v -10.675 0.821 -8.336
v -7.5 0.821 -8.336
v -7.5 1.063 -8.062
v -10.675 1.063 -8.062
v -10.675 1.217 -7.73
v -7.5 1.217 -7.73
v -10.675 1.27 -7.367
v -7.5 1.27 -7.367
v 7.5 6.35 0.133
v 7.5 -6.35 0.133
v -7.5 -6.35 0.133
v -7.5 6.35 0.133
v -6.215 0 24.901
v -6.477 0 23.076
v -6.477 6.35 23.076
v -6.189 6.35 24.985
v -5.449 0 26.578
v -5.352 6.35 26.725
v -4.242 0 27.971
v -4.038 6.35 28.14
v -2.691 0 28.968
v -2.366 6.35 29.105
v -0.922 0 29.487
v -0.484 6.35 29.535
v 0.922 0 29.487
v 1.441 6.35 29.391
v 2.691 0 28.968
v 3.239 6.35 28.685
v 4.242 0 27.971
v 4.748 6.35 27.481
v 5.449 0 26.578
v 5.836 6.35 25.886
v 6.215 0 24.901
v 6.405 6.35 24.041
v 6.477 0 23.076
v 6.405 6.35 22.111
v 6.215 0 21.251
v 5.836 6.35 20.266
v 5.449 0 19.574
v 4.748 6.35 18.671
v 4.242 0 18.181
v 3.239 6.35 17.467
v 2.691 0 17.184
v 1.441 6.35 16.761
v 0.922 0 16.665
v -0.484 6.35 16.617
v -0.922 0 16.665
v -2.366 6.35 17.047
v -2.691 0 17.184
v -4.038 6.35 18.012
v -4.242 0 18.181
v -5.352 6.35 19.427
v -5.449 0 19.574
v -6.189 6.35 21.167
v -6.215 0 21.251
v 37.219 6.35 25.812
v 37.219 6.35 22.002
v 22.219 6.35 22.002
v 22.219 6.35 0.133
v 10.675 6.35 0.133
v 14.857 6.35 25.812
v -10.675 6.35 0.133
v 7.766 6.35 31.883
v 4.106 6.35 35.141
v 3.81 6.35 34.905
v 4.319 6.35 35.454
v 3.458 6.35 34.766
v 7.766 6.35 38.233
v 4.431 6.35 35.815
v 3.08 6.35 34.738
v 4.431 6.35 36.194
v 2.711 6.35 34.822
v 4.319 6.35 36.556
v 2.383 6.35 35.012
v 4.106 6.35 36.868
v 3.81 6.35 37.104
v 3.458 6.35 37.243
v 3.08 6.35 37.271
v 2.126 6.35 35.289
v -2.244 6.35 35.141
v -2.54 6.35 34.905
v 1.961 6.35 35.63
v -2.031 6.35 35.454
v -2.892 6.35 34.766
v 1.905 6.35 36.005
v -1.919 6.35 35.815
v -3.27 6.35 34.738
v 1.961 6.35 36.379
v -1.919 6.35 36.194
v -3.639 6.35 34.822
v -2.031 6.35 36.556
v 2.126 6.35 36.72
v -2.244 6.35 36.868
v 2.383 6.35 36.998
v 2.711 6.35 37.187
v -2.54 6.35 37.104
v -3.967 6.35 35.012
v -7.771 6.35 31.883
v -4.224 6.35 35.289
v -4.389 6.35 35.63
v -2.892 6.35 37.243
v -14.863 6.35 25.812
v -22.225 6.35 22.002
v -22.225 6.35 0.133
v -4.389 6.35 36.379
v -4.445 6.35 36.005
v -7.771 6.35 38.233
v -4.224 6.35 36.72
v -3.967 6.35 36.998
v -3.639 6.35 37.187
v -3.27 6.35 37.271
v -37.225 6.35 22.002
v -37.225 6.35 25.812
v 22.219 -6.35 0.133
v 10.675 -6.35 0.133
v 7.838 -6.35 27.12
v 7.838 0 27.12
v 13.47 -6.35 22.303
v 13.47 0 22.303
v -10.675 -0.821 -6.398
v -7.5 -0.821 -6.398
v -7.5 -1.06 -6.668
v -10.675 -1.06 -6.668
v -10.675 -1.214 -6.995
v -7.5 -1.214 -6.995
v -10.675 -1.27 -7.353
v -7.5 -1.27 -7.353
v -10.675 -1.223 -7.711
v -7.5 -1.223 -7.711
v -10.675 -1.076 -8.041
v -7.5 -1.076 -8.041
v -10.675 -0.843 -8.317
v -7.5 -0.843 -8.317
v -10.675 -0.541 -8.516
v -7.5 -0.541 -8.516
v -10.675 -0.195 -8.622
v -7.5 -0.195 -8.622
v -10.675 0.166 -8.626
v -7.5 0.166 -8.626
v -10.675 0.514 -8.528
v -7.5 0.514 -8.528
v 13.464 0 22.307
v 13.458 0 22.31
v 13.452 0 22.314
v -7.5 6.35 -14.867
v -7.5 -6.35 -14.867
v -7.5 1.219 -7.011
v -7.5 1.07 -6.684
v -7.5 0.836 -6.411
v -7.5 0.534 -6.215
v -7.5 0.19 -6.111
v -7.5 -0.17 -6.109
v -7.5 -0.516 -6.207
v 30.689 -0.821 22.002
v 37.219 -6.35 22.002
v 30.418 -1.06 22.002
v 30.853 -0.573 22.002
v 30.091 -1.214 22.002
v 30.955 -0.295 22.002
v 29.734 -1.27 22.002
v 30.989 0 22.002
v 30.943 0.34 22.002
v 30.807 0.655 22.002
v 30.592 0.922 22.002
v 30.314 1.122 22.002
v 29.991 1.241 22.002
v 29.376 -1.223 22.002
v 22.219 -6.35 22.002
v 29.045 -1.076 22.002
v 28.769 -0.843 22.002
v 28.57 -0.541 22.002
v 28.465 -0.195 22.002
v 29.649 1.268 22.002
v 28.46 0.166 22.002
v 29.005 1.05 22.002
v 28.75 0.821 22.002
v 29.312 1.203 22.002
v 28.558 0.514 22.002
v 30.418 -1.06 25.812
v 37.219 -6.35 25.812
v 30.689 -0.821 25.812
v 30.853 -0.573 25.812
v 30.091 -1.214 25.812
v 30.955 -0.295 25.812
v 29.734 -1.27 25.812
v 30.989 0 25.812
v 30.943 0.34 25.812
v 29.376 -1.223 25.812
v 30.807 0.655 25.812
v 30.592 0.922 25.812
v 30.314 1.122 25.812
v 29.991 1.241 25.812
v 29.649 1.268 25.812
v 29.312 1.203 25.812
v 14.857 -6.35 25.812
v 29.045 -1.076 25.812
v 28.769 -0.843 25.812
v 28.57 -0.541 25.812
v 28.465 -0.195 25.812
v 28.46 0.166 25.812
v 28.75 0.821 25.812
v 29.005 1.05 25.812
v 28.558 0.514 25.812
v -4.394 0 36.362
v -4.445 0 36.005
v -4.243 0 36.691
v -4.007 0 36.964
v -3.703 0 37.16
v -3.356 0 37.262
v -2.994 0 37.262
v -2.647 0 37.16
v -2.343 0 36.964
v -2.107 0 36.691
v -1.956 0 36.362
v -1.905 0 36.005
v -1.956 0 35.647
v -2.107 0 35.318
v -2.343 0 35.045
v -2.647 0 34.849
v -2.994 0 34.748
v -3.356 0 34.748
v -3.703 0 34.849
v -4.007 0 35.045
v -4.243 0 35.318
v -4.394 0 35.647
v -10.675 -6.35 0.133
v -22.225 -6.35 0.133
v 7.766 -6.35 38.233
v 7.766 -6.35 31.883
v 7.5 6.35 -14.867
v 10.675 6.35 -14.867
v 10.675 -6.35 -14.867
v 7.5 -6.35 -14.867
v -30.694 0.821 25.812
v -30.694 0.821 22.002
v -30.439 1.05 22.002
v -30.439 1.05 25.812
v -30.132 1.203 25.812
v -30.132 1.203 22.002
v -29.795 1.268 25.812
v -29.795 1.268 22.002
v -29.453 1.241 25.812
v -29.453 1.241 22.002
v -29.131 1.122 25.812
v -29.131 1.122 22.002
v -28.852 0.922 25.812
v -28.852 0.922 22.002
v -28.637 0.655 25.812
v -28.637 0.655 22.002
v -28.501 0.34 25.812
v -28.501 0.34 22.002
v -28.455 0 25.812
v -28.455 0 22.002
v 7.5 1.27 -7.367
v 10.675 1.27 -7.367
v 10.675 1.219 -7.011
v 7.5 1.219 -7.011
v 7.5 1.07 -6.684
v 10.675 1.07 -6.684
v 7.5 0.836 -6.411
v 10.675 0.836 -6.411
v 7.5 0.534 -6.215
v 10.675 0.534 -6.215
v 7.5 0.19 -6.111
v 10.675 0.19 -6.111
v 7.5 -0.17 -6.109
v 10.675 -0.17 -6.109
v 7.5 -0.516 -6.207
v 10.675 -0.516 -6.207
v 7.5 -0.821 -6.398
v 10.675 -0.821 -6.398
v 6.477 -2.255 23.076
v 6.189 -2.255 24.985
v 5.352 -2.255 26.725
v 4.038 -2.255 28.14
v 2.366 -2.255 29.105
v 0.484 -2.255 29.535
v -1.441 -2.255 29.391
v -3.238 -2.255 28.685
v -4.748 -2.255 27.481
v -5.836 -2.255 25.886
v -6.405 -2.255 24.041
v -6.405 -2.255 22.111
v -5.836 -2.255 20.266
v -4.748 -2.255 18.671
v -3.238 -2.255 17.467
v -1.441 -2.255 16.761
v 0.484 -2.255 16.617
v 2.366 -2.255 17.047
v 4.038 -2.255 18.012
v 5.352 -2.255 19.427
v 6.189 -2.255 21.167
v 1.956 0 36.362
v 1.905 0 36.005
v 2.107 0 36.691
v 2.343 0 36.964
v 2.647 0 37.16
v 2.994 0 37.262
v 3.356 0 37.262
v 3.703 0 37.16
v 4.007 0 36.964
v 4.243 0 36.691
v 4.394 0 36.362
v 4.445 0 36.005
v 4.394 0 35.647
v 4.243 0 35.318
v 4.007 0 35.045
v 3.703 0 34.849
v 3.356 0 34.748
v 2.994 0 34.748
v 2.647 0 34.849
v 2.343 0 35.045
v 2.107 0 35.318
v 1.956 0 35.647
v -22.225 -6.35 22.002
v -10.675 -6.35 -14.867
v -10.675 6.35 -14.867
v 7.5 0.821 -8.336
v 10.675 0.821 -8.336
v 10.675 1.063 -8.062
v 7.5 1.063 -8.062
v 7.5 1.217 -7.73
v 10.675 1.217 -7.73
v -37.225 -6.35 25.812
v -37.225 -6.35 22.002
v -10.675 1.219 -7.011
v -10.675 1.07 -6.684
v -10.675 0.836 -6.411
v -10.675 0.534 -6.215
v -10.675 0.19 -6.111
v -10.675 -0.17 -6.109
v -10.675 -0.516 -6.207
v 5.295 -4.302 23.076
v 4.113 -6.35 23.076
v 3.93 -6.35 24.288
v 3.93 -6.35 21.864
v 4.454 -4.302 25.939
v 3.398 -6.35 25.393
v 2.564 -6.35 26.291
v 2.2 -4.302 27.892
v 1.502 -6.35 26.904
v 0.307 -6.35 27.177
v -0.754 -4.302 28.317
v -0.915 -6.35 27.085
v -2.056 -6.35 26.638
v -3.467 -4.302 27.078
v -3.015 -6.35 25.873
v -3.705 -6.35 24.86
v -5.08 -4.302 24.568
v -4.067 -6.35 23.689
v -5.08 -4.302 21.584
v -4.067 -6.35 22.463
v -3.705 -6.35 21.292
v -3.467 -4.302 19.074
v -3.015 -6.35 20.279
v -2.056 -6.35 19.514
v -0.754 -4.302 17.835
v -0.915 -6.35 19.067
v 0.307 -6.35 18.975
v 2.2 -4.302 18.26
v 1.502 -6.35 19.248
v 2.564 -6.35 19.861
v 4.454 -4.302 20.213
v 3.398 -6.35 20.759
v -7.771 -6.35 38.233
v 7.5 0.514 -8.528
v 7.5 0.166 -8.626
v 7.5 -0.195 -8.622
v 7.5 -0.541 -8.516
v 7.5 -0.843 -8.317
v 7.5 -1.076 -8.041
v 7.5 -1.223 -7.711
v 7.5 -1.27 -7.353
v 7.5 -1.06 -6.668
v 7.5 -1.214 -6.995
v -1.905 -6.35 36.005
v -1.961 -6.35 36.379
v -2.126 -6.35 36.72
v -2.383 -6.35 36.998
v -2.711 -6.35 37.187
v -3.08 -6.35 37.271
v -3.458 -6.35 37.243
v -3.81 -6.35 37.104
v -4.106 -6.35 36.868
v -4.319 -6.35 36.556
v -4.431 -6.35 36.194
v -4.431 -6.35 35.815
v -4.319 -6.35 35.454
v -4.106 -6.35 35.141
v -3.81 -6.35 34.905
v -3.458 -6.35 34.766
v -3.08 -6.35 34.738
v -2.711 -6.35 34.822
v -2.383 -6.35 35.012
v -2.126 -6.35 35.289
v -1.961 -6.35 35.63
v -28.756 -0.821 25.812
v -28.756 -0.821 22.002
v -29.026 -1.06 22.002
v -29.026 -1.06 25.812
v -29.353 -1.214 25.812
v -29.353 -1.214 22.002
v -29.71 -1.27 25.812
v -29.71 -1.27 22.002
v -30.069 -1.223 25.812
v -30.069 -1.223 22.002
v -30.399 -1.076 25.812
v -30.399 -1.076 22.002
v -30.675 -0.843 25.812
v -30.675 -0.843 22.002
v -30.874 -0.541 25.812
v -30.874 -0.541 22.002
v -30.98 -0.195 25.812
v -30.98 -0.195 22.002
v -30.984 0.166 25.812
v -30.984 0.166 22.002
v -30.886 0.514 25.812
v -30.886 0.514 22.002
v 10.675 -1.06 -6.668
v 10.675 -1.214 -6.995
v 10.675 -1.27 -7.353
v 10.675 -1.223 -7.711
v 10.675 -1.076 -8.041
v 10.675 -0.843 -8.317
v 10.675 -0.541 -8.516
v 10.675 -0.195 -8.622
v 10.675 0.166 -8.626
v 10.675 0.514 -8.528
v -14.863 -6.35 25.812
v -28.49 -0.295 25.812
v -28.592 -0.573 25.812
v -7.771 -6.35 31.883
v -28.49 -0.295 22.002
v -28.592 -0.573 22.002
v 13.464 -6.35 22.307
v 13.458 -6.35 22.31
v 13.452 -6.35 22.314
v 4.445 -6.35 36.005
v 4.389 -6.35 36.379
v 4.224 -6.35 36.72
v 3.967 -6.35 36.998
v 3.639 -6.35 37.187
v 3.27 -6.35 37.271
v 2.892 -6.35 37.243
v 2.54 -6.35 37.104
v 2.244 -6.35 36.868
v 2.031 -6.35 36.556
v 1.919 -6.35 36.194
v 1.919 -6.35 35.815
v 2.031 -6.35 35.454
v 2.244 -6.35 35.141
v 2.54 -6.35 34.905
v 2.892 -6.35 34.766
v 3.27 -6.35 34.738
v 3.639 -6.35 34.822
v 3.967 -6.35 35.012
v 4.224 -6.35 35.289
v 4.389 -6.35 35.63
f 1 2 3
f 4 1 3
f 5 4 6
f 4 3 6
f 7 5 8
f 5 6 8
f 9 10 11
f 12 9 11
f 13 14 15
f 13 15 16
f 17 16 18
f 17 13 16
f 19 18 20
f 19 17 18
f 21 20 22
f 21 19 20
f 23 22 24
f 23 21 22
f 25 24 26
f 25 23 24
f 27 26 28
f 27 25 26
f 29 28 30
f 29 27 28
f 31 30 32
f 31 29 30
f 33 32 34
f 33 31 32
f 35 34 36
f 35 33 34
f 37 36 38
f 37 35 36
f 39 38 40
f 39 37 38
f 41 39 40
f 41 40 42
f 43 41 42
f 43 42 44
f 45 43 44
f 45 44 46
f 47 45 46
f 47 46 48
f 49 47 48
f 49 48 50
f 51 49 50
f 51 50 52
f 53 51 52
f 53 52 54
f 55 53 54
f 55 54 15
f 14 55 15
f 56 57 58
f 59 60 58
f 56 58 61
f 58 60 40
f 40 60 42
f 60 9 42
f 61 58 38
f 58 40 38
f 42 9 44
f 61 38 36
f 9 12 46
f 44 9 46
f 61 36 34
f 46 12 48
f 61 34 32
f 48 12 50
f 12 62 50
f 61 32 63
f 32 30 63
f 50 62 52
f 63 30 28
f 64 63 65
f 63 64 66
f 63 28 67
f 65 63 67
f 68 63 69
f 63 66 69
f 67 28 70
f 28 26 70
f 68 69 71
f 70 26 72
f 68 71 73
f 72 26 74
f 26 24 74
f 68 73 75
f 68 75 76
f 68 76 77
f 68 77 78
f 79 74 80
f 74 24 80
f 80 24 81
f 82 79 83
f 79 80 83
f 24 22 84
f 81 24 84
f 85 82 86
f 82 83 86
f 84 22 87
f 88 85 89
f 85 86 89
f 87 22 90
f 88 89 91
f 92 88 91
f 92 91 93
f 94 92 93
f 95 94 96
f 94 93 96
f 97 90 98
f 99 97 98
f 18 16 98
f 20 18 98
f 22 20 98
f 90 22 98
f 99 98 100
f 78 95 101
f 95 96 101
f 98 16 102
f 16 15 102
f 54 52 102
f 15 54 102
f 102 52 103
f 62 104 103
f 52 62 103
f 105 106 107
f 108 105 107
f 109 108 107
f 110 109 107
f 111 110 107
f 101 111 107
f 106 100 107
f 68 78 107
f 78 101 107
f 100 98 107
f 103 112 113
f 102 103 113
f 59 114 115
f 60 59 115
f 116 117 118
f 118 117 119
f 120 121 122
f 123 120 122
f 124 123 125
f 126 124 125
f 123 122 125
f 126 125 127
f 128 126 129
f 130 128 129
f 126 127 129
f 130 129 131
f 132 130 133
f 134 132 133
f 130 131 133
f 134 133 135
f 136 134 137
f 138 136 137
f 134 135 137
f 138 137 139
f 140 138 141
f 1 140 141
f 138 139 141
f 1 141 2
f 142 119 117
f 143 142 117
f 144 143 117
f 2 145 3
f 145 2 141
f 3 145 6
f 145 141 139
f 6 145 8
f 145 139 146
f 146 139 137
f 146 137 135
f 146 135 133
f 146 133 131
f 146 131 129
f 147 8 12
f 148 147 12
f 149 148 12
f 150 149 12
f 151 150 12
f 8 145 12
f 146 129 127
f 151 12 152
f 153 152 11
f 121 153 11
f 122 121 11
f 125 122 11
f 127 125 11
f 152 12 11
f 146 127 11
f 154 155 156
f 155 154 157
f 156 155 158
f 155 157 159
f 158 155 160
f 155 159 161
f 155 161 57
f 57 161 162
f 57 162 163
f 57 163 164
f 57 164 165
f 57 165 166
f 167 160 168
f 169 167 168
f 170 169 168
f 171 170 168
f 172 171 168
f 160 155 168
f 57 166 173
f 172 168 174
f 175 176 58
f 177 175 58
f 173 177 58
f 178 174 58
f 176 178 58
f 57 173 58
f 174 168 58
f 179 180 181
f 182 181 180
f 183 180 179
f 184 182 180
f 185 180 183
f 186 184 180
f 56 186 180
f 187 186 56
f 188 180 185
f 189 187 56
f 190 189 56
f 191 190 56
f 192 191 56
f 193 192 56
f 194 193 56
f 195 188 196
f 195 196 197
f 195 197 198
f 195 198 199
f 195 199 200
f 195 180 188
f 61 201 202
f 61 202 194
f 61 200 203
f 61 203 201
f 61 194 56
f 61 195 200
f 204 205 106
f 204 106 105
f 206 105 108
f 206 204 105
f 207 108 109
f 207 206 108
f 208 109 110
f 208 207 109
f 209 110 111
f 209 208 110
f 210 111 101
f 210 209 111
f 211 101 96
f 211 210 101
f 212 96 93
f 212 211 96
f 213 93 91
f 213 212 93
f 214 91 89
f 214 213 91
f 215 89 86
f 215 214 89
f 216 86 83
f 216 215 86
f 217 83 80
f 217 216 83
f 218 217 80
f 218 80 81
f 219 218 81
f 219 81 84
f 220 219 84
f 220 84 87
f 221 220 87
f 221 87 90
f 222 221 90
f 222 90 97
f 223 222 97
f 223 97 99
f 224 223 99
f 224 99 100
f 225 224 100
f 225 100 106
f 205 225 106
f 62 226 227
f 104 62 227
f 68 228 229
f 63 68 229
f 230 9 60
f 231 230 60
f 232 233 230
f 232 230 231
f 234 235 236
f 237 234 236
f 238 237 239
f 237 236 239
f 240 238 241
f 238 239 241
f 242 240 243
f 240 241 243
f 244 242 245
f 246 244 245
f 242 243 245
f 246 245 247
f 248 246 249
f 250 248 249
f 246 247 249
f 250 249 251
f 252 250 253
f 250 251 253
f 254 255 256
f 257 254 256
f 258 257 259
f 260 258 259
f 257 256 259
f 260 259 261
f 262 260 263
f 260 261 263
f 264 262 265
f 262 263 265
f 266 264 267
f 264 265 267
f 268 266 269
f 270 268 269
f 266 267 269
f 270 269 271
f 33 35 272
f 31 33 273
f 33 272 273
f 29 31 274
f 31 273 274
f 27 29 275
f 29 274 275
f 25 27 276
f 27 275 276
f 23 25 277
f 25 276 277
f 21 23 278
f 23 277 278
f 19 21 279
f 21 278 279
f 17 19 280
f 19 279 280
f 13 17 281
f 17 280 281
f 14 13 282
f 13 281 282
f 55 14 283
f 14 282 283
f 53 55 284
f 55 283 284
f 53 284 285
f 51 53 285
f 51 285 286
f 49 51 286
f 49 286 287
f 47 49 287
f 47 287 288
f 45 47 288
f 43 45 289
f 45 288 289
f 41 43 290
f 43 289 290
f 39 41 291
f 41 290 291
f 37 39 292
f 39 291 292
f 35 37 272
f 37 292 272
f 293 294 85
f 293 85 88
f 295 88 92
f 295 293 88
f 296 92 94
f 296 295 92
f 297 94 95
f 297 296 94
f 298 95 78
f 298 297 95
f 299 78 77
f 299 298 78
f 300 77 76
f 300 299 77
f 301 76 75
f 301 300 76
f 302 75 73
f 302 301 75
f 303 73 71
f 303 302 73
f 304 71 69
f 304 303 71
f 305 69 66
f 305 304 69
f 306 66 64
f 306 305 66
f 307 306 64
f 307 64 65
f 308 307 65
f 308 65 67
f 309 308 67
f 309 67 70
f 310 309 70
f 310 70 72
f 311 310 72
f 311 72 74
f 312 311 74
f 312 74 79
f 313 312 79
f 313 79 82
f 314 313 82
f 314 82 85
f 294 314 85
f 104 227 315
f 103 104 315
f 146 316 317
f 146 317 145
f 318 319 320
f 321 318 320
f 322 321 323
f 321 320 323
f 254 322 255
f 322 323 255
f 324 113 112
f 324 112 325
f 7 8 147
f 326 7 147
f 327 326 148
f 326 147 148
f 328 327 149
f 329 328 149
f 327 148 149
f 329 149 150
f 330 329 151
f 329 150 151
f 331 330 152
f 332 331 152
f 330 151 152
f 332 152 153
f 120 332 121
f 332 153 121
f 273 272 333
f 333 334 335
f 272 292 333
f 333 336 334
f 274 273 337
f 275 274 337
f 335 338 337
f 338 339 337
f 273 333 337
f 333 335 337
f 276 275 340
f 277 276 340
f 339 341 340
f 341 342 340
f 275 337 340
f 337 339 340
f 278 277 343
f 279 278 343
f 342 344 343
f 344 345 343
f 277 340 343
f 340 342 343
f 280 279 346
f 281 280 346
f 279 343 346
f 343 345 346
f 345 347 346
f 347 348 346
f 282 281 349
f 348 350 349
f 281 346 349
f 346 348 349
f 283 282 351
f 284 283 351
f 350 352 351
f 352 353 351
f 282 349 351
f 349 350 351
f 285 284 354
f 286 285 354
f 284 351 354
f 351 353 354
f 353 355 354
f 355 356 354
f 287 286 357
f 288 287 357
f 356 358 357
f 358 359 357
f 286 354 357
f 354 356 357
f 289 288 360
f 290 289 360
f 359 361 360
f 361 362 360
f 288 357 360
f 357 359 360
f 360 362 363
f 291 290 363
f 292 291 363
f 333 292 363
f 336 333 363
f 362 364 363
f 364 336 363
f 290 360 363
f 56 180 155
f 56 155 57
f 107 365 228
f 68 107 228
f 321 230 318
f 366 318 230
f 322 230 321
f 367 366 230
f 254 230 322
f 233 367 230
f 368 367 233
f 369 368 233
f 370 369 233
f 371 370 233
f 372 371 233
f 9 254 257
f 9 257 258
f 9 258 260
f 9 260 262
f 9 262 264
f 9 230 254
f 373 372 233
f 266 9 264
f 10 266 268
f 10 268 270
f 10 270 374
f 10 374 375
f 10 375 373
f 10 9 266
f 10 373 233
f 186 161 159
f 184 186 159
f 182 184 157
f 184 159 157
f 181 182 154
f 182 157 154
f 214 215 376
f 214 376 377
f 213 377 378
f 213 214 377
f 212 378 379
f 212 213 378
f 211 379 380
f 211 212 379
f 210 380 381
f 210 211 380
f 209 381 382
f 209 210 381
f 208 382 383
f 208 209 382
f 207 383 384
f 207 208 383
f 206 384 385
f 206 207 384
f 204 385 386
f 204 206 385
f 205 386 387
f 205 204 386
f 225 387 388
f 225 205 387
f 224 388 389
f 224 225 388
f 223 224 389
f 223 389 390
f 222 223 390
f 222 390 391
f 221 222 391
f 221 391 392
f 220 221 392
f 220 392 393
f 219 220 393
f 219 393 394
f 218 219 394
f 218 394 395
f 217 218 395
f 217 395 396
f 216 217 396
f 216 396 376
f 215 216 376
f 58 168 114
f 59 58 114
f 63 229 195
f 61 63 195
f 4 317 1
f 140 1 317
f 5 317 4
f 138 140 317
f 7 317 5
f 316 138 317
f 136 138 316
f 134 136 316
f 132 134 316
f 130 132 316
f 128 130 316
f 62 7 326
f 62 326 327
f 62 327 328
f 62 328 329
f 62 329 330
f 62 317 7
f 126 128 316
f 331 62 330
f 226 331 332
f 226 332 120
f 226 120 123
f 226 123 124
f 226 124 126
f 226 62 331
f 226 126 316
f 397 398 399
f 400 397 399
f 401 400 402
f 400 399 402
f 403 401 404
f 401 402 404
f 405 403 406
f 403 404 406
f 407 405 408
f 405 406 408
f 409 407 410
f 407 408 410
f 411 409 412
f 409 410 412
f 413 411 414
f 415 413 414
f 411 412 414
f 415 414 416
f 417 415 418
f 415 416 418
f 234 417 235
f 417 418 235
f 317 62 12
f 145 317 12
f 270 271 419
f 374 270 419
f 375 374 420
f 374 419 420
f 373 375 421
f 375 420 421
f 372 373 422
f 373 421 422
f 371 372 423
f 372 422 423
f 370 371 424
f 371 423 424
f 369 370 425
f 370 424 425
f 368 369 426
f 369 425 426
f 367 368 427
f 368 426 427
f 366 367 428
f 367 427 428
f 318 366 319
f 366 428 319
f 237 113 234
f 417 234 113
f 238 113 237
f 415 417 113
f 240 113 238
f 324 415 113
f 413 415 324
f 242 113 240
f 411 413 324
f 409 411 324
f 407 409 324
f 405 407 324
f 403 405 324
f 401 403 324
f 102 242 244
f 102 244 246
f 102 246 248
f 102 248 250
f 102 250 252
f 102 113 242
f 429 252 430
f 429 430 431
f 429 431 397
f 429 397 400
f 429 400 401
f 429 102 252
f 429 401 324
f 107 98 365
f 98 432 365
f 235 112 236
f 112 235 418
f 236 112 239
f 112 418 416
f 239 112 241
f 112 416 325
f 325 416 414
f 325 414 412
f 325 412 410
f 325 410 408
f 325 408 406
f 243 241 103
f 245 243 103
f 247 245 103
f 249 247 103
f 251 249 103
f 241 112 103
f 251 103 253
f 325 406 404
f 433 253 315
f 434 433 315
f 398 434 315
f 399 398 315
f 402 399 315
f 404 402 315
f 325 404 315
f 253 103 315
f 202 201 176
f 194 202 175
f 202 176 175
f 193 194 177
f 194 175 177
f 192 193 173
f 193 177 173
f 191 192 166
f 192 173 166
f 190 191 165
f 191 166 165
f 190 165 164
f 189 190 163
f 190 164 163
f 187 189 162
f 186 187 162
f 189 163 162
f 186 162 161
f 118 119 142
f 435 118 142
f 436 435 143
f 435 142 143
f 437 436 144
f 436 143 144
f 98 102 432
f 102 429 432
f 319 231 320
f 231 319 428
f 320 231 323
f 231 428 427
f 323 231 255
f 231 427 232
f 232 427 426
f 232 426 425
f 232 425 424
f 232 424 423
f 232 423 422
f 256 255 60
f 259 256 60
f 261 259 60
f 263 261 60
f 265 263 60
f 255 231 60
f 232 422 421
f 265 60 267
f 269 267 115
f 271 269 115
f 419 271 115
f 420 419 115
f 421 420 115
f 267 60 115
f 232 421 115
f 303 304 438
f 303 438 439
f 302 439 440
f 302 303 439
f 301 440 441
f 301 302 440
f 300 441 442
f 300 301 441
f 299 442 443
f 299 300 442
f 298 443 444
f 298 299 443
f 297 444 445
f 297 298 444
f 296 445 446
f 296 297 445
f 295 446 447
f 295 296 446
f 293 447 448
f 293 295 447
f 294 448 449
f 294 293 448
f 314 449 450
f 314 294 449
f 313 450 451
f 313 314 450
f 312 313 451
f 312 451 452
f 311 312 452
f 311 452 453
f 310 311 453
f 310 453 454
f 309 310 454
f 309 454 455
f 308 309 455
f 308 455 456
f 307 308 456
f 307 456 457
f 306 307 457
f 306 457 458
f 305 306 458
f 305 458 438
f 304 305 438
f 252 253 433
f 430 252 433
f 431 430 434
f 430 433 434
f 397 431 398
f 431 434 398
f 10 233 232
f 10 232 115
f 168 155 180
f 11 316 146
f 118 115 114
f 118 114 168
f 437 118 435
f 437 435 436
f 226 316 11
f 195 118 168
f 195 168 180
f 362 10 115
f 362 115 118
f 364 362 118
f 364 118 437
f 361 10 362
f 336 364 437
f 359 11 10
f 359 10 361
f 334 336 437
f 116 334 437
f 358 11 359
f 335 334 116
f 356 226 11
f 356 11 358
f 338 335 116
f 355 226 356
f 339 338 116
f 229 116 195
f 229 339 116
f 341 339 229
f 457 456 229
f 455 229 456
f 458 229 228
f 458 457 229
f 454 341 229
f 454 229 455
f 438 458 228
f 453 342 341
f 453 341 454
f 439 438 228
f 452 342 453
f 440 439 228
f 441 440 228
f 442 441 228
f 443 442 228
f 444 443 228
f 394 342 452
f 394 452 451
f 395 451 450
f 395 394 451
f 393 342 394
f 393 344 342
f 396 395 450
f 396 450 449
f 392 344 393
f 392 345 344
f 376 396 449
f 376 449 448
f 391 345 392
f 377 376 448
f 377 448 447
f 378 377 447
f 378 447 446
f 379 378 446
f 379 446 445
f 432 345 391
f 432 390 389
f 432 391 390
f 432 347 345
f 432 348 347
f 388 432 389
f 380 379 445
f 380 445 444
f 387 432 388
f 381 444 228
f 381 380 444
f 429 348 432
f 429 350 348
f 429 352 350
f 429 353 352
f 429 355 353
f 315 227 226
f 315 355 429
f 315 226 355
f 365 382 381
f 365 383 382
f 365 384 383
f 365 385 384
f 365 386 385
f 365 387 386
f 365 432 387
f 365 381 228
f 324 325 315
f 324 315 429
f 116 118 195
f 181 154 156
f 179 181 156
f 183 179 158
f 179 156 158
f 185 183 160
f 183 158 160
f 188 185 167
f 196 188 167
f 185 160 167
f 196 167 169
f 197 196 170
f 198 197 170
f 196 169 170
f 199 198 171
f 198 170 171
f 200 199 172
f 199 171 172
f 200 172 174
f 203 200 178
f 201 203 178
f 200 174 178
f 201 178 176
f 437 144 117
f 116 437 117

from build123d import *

# Parameters (mm, degrees)
F0_R        = 1.27
F0_R_2      = 3.96875
F1_DEPTH    = 6.35
F2_R        = 6.477
F2_R_2      = 1.27
F3_DEPTH    = 6.35
F4_S5_R     = 6.477
F4_T6_DEPTH = 13
F5_W        = 12.7
F5_H        = 3.81
F6_DEPTH    = 14.9999954
F8_DEPTH    = 25.4
F9_W        = 12.7
F9_H        = 3.81
F10_DEPTH   = 14.9999954
F12_DEPTH   = 25.4
F13_W       = 3.175
F13_H       = 12.7
F14_DEPTH   = 14.9999954
F16_DEPTH   = 25.4


# Not quite as in the source:
# - a fillet or chamfer that OpenCascade refuses, or shapes differently, is made with other operations: its cross-section is extruded or revolved along the edge and cut away or added
# - after a boolean that leaves OpenCascade's solid faulty, fix() repairs it
# - ends of sketch curves that miss each other by under 0.0002 mm in the source are joined


with BuildPart() as f1:
    # F0 (on Front) → F1 (new body)
    with BuildSketch(Plane.XZ):
        Polygon((-7.493, 0.1328983575), (0, 0.1328983575), (7.493, 0.1328983575), (22.2194990303, 0.1328983575), (22.2194990303, 19.5094533027), (14.8570176459, 25.8122983575), (7.7658264293, 31.8828983575), (7.7658264293, 38.2328983575), (-7.7713273633, 38.2328983575), (-7.7713273633, 31.8828983575), (-14.8625185798, 25.8122983575), (-22.2249999642, 19.5094533027), (-22.2249999642, 4.5234533027), (-22.2249999642, 0.1328983575), align=None)
        with Locations((-3.175, 36.0046029091)):
            Circle(F0_R, mode=Mode.SUBTRACT)
        with BuildLine():
            ThreePointArc((-1.6471995105, 13.7654938087), (-14.0416307026, 9.056743723), (-13.4701421127, 22.3031640975))
            Line((-13.4701421127, 22.3031640975), (-7.8430329322, 27.1203983575))
            Line((-7.8430329322, 27.1203983575), (-3.175, 27.1203983575))
            Line((-3.175, 27.1203983575), (-3.175, 30.2953983575))
            Line((-3.175, 30.2953983575), (-3.175, 33.4703983575))
            Line((-3.175, 33.4703983575), (3.175, 33.4703983575))
            Line((3.175, 33.4703983575), (3.175, 30.2953983575))
            Line((3.175, 30.2953983575), (3.175, 27.1203983575))
            Line((3.175, 27.1203983575), (7.8375319983, 27.1203983575))
            Line((7.8375319983, 27.1203983575), (13.4701421127, 22.3031640975))
            ThreePointArc((13.4701421127, 22.3031640975), (16.2995077669, 19.40684068), (17.3322006389, 15.4917998403))
            ThreePointArc((17.3322006389, 15.4917998403), (10.2711150187, 7.6028326022), (1.6507381924, 13.7496885133))
            ThreePointArc((1.6507381924, 13.7496885133), (0.0063534061, 14.7141035739), (-1.6471995105, 13.7654938087))
        make_face(mode=Mode.SUBTRACT)
        with Locations((3.175, 36.0046029091)):
            Circle(F0_R, mode=Mode.SUBTRACT)
        Polygon((14.8570176459, 25.8122983575), (22.2194990303, 19.5094533027), (22.2194990303, 25.8122983575), (17.4187807526, 25.8122983575), align=None)
        Polygon((-22.2249999642, 25.8122983575), (-22.2249999642, 19.5094533027), (-14.8625185798, 25.8122983575), (-17.4242816865, 25.8122983575), align=None)
        with BuildLine():
            ThreePointArc((13.4519986436, 22.3139871107), (4.7326542757, 21.9159130054), (1.6507381924, 13.7496885133))
            ThreePointArc((1.6507381924, 13.7496885133), (10.2711150187, 7.6028326022), (17.3322006389, 15.4917998403))
            ThreePointArc((17.3322006389, 15.4917998403), (16.2995077669, 19.40684068), (13.4701421127, 22.3031640975))
            ThreePointArc((13.4701421127, 22.3031640975), (13.461073979, 22.3085816404), (13.4519986436, 22.3139871107))
        make_face()
        with BuildLine():
            ThreePointArc((-1.4572006389, 15.4917998403), (-5.4796598384, 22.3966069904), (-13.4701421898, 22.3031640514))
            ThreePointArc((-13.4701421127, 22.3031640975), (-14.0416307026, 9.056743723), (-1.6471995105, 13.7654938087))
            ThreePointArc((-1.6471995105, 13.7654938087), (-1.5048433381, 14.6234346974), (-1.4572006389, 15.4917998403))
        make_face()
        with BuildLine():
            Line((-7.8430329322, 27.1203983575), (-13.4701422669, 22.3031640053))
            ThreePointArc((-13.4701421898, 22.3031640514), (-5.4796598384, 22.3966069904), (-1.4572006389, 15.4917998403))
            ThreePointArc((-1.4572006389, 15.4917998403), (-1.5048433381, 14.6234346974), (-1.6471995105, 13.7654938087))
            ThreePointArc((-1.6471995105, 13.7654938087), (0.0063534061, 14.7141035739), (1.6507381924, 13.7496885133))
            ThreePointArc((1.6507381924, 13.7496885133), (4.7326542757, 21.9159130054), (13.4519986436, 22.3139871107))
            Line((13.4519986436, 22.3139871107), (7.8375319983, 27.1203983575))
            Line((7.8375319983, 27.1203983575), (3.175, 27.1203983575))
            Line((3.175, 27.1203983575), (3.175, 30.2953983575))
            Line((3.175, 30.2953983575), (3.175, 33.4703983575))
            Line((3.175, 33.4703983575), (-3.175, 33.4703983575))
            Line((-3.175, 33.4703983575), (-3.175, 30.2953983575))
            Line((-3.175, 30.2953983575), (-3.175, 27.1203983575))
            Line((-3.175, 27.1203983575), (-7.8430329322, 27.1203983575))
        make_face()
        with Locations((0, 23.0759866536)):
            Circle(F0_R_2, mode=Mode.SUBTRACT)
    extrude(amount=F1_DEPTH)

    # F2 (on face) → F3 (join)
    with BuildSketch(Plane(origin=(0, 0, 0), x_dir=(-1, 0, 0), z_dir=(0, 1, 0))):
        Polygon((-22.2194990303, 25.8122983575), (-22.2194990303, 0.1328983575), (22.2249999642, 0.1328983575), (22.2249999642, 25.8122983575), (14.8625185798, 25.8122983575), (7.7713273633, 31.8828983575), (7.7713273633, 38.2328983575), (-7.7658264293, 38.2328983575), (-7.7658264293, 31.8828983575), (-14.8570176459, 25.8122983575), align=None)
        with Locations((0, 23.0759866536)):
            Circle(F2_R, mode=Mode.SUBTRACT)
        with Locations((-3.175, 36.0046029091)):
            Circle(F2_R_2, mode=Mode.SUBTRACT)
        with Locations((3.175, 36.0046029091)):
            Circle(F2_R_2, mode=Mode.SUBTRACT)
    extrude(amount=F3_DEPTH)

    # F4: chamfer of 3.81 x 6.5991135768 on 1 edges, made by hand


with BuildPart() as f4_tool2:
    # F4_s3 → F4_t4 (revolve)
    with BuildSketch(Plane.XY.offset(23.0759866536)):
        Polygon((7.77875, 0), (3.96875, -6.5991135768), (3.96875, 0), align=None)
    revolve(axis=Axis((0, 0, 23.0759866536), (0, -1, 0)))

    # F4_s5 → F4_t6 (intersect, symmetric)
    with BuildSketch(Plane.XZ.offset(3.3)):
        with Locations((0, 23.0759866536)):
            Circle(F4_S5_R)
    extrude(amount=F4_T6_DEPTH, both=True, mode=Mode.INTERSECT)


with BuildPart() as f1_1:
    add(f1.part)

    # F4_t1: cut F4_tool2
    add(f4_tool2.part, mode=Mode.SUBTRACT)

    # F5 (on face) → F6 (join)
    with BuildSketch(Plane(origin=(-22.2249999642, 0, 0), x_dir=(0, -1, 0), z_dir=(-1, 0, 0))):
        with Locations((0, 23.9072983575)):
            Rectangle(F5_W, F5_H)
    extrude(amount=F6_DEPTH)

    # F7 (on face) → F8 (cut)
    with BuildSketch(Plane(origin=(0, 0, 22.0022983575), x_dir=(1, 0, 0), z_dir=(0, 0, -1))):
        with BuildLine():
            ThreePointArc((-28.7557423483, 0.8206364192), (-30.5456340834, 0.969255316), (-30.6942529802, -0.8206364192))
            Line((-30.6942529802, -0.8206364192), (-28.7557423483, 0.8206364192))
        make_face()
        with BuildLine():
            Line((-28.7557423483, 0.8206364192), (-30.6942529802, -0.8206364192))
            ThreePointArc((-30.6942529802, -0.8206364192), (-29.2879932313, -1.1924458586), (-28.4549976642, 0))
            ThreePointArc((-28.4549976642, 0), (-28.5325518057, 0.4370044329), (-28.7557423483, 0.8206364192))
        make_face()
    extrude(amount=-F8_DEPTH, mode=Mode.SUBTRACT)

    # F9 (on face) → F10 (join)
    with BuildSketch(Plane.YZ.offset(22.2194990303)):
        with Locations((0, 23.9072983575)):
            Rectangle(F9_W, F9_H)
    extrude(amount=F10_DEPTH)

    # F11 (on face) → F12 (cut)
    with BuildSketch(Plane(origin=(0, 0, 22.0022983575), x_dir=(1, 0, 0), z_dir=(0, 0, -1))):
        with BuildLine():
            ThreePointArc((30.9894967303, 0), (30.9119425889, 0.4370044329), (30.6887520463, 0.8206364192))
            Line((30.6887520463, 0.8206364192), (28.7502414143, -0.8206364192))
            ThreePointArc((28.7502414143, -0.8206364192), (30.1565011632, -1.1924458586), (30.9894967303, 0))
        make_face()
        with BuildLine():
            Line((28.7502414143, -0.8206364192), (30.6887520463, 0.8206364192))
            ThreePointArc((30.6887520463, 0.8206364192), (28.8988603111, 0.969255316), (28.7502414143, -0.8206364192))
        make_face()
    extrude(amount=-F12_DEPTH, mode=Mode.SUBTRACT)

    # F13 (on face) → F14 (join)
    with BuildSketch(Plane(origin=(0, 0, 0.1328983575), x_dir=(1, 0, 0), z_dir=(0, 0, -1))):
        with Locations((9.0874977, 0)):
            Rectangle(F13_W, F13_H)
        with Locations((-9.0874977, 0)):
            Rectangle(F13_W, F13_H)
    extrude(amount=F14_DEPTH)

    add(f1_1.part.fix(), mode=Mode.REPLACE)

    # F15 (on face) → F16 (cut)
    with BuildSketch(Plane.YZ.offset(10.6749977)):
        with BuildLine():
            ThreePointArc((1.27, -7.3670993425), (0.5341777549, -6.2149039918), (-0.8206364192, -6.3978440265))
            Line((-0.8206364192, -6.3978440265), (0.8206364192, -8.3363546585))
            ThreePointArc((0.8206364192, -8.3363546585), (1.1521953507, -7.9012770974), (1.27, -7.3670993425))
        make_face()
        with BuildLine():
            Line((0.8206364192, -8.3363546585), (-0.8206364192, -6.3978440265))
            ThreePointArc((-0.8206364192, -6.3978440265), (-0.969255316, -8.1877357617), (0.8206364192, -8.3363546585))
        make_face()
    extrude(amount=-F16_DEPTH, mode=Mode.SUBTRACT)


solid = f1_1.part
